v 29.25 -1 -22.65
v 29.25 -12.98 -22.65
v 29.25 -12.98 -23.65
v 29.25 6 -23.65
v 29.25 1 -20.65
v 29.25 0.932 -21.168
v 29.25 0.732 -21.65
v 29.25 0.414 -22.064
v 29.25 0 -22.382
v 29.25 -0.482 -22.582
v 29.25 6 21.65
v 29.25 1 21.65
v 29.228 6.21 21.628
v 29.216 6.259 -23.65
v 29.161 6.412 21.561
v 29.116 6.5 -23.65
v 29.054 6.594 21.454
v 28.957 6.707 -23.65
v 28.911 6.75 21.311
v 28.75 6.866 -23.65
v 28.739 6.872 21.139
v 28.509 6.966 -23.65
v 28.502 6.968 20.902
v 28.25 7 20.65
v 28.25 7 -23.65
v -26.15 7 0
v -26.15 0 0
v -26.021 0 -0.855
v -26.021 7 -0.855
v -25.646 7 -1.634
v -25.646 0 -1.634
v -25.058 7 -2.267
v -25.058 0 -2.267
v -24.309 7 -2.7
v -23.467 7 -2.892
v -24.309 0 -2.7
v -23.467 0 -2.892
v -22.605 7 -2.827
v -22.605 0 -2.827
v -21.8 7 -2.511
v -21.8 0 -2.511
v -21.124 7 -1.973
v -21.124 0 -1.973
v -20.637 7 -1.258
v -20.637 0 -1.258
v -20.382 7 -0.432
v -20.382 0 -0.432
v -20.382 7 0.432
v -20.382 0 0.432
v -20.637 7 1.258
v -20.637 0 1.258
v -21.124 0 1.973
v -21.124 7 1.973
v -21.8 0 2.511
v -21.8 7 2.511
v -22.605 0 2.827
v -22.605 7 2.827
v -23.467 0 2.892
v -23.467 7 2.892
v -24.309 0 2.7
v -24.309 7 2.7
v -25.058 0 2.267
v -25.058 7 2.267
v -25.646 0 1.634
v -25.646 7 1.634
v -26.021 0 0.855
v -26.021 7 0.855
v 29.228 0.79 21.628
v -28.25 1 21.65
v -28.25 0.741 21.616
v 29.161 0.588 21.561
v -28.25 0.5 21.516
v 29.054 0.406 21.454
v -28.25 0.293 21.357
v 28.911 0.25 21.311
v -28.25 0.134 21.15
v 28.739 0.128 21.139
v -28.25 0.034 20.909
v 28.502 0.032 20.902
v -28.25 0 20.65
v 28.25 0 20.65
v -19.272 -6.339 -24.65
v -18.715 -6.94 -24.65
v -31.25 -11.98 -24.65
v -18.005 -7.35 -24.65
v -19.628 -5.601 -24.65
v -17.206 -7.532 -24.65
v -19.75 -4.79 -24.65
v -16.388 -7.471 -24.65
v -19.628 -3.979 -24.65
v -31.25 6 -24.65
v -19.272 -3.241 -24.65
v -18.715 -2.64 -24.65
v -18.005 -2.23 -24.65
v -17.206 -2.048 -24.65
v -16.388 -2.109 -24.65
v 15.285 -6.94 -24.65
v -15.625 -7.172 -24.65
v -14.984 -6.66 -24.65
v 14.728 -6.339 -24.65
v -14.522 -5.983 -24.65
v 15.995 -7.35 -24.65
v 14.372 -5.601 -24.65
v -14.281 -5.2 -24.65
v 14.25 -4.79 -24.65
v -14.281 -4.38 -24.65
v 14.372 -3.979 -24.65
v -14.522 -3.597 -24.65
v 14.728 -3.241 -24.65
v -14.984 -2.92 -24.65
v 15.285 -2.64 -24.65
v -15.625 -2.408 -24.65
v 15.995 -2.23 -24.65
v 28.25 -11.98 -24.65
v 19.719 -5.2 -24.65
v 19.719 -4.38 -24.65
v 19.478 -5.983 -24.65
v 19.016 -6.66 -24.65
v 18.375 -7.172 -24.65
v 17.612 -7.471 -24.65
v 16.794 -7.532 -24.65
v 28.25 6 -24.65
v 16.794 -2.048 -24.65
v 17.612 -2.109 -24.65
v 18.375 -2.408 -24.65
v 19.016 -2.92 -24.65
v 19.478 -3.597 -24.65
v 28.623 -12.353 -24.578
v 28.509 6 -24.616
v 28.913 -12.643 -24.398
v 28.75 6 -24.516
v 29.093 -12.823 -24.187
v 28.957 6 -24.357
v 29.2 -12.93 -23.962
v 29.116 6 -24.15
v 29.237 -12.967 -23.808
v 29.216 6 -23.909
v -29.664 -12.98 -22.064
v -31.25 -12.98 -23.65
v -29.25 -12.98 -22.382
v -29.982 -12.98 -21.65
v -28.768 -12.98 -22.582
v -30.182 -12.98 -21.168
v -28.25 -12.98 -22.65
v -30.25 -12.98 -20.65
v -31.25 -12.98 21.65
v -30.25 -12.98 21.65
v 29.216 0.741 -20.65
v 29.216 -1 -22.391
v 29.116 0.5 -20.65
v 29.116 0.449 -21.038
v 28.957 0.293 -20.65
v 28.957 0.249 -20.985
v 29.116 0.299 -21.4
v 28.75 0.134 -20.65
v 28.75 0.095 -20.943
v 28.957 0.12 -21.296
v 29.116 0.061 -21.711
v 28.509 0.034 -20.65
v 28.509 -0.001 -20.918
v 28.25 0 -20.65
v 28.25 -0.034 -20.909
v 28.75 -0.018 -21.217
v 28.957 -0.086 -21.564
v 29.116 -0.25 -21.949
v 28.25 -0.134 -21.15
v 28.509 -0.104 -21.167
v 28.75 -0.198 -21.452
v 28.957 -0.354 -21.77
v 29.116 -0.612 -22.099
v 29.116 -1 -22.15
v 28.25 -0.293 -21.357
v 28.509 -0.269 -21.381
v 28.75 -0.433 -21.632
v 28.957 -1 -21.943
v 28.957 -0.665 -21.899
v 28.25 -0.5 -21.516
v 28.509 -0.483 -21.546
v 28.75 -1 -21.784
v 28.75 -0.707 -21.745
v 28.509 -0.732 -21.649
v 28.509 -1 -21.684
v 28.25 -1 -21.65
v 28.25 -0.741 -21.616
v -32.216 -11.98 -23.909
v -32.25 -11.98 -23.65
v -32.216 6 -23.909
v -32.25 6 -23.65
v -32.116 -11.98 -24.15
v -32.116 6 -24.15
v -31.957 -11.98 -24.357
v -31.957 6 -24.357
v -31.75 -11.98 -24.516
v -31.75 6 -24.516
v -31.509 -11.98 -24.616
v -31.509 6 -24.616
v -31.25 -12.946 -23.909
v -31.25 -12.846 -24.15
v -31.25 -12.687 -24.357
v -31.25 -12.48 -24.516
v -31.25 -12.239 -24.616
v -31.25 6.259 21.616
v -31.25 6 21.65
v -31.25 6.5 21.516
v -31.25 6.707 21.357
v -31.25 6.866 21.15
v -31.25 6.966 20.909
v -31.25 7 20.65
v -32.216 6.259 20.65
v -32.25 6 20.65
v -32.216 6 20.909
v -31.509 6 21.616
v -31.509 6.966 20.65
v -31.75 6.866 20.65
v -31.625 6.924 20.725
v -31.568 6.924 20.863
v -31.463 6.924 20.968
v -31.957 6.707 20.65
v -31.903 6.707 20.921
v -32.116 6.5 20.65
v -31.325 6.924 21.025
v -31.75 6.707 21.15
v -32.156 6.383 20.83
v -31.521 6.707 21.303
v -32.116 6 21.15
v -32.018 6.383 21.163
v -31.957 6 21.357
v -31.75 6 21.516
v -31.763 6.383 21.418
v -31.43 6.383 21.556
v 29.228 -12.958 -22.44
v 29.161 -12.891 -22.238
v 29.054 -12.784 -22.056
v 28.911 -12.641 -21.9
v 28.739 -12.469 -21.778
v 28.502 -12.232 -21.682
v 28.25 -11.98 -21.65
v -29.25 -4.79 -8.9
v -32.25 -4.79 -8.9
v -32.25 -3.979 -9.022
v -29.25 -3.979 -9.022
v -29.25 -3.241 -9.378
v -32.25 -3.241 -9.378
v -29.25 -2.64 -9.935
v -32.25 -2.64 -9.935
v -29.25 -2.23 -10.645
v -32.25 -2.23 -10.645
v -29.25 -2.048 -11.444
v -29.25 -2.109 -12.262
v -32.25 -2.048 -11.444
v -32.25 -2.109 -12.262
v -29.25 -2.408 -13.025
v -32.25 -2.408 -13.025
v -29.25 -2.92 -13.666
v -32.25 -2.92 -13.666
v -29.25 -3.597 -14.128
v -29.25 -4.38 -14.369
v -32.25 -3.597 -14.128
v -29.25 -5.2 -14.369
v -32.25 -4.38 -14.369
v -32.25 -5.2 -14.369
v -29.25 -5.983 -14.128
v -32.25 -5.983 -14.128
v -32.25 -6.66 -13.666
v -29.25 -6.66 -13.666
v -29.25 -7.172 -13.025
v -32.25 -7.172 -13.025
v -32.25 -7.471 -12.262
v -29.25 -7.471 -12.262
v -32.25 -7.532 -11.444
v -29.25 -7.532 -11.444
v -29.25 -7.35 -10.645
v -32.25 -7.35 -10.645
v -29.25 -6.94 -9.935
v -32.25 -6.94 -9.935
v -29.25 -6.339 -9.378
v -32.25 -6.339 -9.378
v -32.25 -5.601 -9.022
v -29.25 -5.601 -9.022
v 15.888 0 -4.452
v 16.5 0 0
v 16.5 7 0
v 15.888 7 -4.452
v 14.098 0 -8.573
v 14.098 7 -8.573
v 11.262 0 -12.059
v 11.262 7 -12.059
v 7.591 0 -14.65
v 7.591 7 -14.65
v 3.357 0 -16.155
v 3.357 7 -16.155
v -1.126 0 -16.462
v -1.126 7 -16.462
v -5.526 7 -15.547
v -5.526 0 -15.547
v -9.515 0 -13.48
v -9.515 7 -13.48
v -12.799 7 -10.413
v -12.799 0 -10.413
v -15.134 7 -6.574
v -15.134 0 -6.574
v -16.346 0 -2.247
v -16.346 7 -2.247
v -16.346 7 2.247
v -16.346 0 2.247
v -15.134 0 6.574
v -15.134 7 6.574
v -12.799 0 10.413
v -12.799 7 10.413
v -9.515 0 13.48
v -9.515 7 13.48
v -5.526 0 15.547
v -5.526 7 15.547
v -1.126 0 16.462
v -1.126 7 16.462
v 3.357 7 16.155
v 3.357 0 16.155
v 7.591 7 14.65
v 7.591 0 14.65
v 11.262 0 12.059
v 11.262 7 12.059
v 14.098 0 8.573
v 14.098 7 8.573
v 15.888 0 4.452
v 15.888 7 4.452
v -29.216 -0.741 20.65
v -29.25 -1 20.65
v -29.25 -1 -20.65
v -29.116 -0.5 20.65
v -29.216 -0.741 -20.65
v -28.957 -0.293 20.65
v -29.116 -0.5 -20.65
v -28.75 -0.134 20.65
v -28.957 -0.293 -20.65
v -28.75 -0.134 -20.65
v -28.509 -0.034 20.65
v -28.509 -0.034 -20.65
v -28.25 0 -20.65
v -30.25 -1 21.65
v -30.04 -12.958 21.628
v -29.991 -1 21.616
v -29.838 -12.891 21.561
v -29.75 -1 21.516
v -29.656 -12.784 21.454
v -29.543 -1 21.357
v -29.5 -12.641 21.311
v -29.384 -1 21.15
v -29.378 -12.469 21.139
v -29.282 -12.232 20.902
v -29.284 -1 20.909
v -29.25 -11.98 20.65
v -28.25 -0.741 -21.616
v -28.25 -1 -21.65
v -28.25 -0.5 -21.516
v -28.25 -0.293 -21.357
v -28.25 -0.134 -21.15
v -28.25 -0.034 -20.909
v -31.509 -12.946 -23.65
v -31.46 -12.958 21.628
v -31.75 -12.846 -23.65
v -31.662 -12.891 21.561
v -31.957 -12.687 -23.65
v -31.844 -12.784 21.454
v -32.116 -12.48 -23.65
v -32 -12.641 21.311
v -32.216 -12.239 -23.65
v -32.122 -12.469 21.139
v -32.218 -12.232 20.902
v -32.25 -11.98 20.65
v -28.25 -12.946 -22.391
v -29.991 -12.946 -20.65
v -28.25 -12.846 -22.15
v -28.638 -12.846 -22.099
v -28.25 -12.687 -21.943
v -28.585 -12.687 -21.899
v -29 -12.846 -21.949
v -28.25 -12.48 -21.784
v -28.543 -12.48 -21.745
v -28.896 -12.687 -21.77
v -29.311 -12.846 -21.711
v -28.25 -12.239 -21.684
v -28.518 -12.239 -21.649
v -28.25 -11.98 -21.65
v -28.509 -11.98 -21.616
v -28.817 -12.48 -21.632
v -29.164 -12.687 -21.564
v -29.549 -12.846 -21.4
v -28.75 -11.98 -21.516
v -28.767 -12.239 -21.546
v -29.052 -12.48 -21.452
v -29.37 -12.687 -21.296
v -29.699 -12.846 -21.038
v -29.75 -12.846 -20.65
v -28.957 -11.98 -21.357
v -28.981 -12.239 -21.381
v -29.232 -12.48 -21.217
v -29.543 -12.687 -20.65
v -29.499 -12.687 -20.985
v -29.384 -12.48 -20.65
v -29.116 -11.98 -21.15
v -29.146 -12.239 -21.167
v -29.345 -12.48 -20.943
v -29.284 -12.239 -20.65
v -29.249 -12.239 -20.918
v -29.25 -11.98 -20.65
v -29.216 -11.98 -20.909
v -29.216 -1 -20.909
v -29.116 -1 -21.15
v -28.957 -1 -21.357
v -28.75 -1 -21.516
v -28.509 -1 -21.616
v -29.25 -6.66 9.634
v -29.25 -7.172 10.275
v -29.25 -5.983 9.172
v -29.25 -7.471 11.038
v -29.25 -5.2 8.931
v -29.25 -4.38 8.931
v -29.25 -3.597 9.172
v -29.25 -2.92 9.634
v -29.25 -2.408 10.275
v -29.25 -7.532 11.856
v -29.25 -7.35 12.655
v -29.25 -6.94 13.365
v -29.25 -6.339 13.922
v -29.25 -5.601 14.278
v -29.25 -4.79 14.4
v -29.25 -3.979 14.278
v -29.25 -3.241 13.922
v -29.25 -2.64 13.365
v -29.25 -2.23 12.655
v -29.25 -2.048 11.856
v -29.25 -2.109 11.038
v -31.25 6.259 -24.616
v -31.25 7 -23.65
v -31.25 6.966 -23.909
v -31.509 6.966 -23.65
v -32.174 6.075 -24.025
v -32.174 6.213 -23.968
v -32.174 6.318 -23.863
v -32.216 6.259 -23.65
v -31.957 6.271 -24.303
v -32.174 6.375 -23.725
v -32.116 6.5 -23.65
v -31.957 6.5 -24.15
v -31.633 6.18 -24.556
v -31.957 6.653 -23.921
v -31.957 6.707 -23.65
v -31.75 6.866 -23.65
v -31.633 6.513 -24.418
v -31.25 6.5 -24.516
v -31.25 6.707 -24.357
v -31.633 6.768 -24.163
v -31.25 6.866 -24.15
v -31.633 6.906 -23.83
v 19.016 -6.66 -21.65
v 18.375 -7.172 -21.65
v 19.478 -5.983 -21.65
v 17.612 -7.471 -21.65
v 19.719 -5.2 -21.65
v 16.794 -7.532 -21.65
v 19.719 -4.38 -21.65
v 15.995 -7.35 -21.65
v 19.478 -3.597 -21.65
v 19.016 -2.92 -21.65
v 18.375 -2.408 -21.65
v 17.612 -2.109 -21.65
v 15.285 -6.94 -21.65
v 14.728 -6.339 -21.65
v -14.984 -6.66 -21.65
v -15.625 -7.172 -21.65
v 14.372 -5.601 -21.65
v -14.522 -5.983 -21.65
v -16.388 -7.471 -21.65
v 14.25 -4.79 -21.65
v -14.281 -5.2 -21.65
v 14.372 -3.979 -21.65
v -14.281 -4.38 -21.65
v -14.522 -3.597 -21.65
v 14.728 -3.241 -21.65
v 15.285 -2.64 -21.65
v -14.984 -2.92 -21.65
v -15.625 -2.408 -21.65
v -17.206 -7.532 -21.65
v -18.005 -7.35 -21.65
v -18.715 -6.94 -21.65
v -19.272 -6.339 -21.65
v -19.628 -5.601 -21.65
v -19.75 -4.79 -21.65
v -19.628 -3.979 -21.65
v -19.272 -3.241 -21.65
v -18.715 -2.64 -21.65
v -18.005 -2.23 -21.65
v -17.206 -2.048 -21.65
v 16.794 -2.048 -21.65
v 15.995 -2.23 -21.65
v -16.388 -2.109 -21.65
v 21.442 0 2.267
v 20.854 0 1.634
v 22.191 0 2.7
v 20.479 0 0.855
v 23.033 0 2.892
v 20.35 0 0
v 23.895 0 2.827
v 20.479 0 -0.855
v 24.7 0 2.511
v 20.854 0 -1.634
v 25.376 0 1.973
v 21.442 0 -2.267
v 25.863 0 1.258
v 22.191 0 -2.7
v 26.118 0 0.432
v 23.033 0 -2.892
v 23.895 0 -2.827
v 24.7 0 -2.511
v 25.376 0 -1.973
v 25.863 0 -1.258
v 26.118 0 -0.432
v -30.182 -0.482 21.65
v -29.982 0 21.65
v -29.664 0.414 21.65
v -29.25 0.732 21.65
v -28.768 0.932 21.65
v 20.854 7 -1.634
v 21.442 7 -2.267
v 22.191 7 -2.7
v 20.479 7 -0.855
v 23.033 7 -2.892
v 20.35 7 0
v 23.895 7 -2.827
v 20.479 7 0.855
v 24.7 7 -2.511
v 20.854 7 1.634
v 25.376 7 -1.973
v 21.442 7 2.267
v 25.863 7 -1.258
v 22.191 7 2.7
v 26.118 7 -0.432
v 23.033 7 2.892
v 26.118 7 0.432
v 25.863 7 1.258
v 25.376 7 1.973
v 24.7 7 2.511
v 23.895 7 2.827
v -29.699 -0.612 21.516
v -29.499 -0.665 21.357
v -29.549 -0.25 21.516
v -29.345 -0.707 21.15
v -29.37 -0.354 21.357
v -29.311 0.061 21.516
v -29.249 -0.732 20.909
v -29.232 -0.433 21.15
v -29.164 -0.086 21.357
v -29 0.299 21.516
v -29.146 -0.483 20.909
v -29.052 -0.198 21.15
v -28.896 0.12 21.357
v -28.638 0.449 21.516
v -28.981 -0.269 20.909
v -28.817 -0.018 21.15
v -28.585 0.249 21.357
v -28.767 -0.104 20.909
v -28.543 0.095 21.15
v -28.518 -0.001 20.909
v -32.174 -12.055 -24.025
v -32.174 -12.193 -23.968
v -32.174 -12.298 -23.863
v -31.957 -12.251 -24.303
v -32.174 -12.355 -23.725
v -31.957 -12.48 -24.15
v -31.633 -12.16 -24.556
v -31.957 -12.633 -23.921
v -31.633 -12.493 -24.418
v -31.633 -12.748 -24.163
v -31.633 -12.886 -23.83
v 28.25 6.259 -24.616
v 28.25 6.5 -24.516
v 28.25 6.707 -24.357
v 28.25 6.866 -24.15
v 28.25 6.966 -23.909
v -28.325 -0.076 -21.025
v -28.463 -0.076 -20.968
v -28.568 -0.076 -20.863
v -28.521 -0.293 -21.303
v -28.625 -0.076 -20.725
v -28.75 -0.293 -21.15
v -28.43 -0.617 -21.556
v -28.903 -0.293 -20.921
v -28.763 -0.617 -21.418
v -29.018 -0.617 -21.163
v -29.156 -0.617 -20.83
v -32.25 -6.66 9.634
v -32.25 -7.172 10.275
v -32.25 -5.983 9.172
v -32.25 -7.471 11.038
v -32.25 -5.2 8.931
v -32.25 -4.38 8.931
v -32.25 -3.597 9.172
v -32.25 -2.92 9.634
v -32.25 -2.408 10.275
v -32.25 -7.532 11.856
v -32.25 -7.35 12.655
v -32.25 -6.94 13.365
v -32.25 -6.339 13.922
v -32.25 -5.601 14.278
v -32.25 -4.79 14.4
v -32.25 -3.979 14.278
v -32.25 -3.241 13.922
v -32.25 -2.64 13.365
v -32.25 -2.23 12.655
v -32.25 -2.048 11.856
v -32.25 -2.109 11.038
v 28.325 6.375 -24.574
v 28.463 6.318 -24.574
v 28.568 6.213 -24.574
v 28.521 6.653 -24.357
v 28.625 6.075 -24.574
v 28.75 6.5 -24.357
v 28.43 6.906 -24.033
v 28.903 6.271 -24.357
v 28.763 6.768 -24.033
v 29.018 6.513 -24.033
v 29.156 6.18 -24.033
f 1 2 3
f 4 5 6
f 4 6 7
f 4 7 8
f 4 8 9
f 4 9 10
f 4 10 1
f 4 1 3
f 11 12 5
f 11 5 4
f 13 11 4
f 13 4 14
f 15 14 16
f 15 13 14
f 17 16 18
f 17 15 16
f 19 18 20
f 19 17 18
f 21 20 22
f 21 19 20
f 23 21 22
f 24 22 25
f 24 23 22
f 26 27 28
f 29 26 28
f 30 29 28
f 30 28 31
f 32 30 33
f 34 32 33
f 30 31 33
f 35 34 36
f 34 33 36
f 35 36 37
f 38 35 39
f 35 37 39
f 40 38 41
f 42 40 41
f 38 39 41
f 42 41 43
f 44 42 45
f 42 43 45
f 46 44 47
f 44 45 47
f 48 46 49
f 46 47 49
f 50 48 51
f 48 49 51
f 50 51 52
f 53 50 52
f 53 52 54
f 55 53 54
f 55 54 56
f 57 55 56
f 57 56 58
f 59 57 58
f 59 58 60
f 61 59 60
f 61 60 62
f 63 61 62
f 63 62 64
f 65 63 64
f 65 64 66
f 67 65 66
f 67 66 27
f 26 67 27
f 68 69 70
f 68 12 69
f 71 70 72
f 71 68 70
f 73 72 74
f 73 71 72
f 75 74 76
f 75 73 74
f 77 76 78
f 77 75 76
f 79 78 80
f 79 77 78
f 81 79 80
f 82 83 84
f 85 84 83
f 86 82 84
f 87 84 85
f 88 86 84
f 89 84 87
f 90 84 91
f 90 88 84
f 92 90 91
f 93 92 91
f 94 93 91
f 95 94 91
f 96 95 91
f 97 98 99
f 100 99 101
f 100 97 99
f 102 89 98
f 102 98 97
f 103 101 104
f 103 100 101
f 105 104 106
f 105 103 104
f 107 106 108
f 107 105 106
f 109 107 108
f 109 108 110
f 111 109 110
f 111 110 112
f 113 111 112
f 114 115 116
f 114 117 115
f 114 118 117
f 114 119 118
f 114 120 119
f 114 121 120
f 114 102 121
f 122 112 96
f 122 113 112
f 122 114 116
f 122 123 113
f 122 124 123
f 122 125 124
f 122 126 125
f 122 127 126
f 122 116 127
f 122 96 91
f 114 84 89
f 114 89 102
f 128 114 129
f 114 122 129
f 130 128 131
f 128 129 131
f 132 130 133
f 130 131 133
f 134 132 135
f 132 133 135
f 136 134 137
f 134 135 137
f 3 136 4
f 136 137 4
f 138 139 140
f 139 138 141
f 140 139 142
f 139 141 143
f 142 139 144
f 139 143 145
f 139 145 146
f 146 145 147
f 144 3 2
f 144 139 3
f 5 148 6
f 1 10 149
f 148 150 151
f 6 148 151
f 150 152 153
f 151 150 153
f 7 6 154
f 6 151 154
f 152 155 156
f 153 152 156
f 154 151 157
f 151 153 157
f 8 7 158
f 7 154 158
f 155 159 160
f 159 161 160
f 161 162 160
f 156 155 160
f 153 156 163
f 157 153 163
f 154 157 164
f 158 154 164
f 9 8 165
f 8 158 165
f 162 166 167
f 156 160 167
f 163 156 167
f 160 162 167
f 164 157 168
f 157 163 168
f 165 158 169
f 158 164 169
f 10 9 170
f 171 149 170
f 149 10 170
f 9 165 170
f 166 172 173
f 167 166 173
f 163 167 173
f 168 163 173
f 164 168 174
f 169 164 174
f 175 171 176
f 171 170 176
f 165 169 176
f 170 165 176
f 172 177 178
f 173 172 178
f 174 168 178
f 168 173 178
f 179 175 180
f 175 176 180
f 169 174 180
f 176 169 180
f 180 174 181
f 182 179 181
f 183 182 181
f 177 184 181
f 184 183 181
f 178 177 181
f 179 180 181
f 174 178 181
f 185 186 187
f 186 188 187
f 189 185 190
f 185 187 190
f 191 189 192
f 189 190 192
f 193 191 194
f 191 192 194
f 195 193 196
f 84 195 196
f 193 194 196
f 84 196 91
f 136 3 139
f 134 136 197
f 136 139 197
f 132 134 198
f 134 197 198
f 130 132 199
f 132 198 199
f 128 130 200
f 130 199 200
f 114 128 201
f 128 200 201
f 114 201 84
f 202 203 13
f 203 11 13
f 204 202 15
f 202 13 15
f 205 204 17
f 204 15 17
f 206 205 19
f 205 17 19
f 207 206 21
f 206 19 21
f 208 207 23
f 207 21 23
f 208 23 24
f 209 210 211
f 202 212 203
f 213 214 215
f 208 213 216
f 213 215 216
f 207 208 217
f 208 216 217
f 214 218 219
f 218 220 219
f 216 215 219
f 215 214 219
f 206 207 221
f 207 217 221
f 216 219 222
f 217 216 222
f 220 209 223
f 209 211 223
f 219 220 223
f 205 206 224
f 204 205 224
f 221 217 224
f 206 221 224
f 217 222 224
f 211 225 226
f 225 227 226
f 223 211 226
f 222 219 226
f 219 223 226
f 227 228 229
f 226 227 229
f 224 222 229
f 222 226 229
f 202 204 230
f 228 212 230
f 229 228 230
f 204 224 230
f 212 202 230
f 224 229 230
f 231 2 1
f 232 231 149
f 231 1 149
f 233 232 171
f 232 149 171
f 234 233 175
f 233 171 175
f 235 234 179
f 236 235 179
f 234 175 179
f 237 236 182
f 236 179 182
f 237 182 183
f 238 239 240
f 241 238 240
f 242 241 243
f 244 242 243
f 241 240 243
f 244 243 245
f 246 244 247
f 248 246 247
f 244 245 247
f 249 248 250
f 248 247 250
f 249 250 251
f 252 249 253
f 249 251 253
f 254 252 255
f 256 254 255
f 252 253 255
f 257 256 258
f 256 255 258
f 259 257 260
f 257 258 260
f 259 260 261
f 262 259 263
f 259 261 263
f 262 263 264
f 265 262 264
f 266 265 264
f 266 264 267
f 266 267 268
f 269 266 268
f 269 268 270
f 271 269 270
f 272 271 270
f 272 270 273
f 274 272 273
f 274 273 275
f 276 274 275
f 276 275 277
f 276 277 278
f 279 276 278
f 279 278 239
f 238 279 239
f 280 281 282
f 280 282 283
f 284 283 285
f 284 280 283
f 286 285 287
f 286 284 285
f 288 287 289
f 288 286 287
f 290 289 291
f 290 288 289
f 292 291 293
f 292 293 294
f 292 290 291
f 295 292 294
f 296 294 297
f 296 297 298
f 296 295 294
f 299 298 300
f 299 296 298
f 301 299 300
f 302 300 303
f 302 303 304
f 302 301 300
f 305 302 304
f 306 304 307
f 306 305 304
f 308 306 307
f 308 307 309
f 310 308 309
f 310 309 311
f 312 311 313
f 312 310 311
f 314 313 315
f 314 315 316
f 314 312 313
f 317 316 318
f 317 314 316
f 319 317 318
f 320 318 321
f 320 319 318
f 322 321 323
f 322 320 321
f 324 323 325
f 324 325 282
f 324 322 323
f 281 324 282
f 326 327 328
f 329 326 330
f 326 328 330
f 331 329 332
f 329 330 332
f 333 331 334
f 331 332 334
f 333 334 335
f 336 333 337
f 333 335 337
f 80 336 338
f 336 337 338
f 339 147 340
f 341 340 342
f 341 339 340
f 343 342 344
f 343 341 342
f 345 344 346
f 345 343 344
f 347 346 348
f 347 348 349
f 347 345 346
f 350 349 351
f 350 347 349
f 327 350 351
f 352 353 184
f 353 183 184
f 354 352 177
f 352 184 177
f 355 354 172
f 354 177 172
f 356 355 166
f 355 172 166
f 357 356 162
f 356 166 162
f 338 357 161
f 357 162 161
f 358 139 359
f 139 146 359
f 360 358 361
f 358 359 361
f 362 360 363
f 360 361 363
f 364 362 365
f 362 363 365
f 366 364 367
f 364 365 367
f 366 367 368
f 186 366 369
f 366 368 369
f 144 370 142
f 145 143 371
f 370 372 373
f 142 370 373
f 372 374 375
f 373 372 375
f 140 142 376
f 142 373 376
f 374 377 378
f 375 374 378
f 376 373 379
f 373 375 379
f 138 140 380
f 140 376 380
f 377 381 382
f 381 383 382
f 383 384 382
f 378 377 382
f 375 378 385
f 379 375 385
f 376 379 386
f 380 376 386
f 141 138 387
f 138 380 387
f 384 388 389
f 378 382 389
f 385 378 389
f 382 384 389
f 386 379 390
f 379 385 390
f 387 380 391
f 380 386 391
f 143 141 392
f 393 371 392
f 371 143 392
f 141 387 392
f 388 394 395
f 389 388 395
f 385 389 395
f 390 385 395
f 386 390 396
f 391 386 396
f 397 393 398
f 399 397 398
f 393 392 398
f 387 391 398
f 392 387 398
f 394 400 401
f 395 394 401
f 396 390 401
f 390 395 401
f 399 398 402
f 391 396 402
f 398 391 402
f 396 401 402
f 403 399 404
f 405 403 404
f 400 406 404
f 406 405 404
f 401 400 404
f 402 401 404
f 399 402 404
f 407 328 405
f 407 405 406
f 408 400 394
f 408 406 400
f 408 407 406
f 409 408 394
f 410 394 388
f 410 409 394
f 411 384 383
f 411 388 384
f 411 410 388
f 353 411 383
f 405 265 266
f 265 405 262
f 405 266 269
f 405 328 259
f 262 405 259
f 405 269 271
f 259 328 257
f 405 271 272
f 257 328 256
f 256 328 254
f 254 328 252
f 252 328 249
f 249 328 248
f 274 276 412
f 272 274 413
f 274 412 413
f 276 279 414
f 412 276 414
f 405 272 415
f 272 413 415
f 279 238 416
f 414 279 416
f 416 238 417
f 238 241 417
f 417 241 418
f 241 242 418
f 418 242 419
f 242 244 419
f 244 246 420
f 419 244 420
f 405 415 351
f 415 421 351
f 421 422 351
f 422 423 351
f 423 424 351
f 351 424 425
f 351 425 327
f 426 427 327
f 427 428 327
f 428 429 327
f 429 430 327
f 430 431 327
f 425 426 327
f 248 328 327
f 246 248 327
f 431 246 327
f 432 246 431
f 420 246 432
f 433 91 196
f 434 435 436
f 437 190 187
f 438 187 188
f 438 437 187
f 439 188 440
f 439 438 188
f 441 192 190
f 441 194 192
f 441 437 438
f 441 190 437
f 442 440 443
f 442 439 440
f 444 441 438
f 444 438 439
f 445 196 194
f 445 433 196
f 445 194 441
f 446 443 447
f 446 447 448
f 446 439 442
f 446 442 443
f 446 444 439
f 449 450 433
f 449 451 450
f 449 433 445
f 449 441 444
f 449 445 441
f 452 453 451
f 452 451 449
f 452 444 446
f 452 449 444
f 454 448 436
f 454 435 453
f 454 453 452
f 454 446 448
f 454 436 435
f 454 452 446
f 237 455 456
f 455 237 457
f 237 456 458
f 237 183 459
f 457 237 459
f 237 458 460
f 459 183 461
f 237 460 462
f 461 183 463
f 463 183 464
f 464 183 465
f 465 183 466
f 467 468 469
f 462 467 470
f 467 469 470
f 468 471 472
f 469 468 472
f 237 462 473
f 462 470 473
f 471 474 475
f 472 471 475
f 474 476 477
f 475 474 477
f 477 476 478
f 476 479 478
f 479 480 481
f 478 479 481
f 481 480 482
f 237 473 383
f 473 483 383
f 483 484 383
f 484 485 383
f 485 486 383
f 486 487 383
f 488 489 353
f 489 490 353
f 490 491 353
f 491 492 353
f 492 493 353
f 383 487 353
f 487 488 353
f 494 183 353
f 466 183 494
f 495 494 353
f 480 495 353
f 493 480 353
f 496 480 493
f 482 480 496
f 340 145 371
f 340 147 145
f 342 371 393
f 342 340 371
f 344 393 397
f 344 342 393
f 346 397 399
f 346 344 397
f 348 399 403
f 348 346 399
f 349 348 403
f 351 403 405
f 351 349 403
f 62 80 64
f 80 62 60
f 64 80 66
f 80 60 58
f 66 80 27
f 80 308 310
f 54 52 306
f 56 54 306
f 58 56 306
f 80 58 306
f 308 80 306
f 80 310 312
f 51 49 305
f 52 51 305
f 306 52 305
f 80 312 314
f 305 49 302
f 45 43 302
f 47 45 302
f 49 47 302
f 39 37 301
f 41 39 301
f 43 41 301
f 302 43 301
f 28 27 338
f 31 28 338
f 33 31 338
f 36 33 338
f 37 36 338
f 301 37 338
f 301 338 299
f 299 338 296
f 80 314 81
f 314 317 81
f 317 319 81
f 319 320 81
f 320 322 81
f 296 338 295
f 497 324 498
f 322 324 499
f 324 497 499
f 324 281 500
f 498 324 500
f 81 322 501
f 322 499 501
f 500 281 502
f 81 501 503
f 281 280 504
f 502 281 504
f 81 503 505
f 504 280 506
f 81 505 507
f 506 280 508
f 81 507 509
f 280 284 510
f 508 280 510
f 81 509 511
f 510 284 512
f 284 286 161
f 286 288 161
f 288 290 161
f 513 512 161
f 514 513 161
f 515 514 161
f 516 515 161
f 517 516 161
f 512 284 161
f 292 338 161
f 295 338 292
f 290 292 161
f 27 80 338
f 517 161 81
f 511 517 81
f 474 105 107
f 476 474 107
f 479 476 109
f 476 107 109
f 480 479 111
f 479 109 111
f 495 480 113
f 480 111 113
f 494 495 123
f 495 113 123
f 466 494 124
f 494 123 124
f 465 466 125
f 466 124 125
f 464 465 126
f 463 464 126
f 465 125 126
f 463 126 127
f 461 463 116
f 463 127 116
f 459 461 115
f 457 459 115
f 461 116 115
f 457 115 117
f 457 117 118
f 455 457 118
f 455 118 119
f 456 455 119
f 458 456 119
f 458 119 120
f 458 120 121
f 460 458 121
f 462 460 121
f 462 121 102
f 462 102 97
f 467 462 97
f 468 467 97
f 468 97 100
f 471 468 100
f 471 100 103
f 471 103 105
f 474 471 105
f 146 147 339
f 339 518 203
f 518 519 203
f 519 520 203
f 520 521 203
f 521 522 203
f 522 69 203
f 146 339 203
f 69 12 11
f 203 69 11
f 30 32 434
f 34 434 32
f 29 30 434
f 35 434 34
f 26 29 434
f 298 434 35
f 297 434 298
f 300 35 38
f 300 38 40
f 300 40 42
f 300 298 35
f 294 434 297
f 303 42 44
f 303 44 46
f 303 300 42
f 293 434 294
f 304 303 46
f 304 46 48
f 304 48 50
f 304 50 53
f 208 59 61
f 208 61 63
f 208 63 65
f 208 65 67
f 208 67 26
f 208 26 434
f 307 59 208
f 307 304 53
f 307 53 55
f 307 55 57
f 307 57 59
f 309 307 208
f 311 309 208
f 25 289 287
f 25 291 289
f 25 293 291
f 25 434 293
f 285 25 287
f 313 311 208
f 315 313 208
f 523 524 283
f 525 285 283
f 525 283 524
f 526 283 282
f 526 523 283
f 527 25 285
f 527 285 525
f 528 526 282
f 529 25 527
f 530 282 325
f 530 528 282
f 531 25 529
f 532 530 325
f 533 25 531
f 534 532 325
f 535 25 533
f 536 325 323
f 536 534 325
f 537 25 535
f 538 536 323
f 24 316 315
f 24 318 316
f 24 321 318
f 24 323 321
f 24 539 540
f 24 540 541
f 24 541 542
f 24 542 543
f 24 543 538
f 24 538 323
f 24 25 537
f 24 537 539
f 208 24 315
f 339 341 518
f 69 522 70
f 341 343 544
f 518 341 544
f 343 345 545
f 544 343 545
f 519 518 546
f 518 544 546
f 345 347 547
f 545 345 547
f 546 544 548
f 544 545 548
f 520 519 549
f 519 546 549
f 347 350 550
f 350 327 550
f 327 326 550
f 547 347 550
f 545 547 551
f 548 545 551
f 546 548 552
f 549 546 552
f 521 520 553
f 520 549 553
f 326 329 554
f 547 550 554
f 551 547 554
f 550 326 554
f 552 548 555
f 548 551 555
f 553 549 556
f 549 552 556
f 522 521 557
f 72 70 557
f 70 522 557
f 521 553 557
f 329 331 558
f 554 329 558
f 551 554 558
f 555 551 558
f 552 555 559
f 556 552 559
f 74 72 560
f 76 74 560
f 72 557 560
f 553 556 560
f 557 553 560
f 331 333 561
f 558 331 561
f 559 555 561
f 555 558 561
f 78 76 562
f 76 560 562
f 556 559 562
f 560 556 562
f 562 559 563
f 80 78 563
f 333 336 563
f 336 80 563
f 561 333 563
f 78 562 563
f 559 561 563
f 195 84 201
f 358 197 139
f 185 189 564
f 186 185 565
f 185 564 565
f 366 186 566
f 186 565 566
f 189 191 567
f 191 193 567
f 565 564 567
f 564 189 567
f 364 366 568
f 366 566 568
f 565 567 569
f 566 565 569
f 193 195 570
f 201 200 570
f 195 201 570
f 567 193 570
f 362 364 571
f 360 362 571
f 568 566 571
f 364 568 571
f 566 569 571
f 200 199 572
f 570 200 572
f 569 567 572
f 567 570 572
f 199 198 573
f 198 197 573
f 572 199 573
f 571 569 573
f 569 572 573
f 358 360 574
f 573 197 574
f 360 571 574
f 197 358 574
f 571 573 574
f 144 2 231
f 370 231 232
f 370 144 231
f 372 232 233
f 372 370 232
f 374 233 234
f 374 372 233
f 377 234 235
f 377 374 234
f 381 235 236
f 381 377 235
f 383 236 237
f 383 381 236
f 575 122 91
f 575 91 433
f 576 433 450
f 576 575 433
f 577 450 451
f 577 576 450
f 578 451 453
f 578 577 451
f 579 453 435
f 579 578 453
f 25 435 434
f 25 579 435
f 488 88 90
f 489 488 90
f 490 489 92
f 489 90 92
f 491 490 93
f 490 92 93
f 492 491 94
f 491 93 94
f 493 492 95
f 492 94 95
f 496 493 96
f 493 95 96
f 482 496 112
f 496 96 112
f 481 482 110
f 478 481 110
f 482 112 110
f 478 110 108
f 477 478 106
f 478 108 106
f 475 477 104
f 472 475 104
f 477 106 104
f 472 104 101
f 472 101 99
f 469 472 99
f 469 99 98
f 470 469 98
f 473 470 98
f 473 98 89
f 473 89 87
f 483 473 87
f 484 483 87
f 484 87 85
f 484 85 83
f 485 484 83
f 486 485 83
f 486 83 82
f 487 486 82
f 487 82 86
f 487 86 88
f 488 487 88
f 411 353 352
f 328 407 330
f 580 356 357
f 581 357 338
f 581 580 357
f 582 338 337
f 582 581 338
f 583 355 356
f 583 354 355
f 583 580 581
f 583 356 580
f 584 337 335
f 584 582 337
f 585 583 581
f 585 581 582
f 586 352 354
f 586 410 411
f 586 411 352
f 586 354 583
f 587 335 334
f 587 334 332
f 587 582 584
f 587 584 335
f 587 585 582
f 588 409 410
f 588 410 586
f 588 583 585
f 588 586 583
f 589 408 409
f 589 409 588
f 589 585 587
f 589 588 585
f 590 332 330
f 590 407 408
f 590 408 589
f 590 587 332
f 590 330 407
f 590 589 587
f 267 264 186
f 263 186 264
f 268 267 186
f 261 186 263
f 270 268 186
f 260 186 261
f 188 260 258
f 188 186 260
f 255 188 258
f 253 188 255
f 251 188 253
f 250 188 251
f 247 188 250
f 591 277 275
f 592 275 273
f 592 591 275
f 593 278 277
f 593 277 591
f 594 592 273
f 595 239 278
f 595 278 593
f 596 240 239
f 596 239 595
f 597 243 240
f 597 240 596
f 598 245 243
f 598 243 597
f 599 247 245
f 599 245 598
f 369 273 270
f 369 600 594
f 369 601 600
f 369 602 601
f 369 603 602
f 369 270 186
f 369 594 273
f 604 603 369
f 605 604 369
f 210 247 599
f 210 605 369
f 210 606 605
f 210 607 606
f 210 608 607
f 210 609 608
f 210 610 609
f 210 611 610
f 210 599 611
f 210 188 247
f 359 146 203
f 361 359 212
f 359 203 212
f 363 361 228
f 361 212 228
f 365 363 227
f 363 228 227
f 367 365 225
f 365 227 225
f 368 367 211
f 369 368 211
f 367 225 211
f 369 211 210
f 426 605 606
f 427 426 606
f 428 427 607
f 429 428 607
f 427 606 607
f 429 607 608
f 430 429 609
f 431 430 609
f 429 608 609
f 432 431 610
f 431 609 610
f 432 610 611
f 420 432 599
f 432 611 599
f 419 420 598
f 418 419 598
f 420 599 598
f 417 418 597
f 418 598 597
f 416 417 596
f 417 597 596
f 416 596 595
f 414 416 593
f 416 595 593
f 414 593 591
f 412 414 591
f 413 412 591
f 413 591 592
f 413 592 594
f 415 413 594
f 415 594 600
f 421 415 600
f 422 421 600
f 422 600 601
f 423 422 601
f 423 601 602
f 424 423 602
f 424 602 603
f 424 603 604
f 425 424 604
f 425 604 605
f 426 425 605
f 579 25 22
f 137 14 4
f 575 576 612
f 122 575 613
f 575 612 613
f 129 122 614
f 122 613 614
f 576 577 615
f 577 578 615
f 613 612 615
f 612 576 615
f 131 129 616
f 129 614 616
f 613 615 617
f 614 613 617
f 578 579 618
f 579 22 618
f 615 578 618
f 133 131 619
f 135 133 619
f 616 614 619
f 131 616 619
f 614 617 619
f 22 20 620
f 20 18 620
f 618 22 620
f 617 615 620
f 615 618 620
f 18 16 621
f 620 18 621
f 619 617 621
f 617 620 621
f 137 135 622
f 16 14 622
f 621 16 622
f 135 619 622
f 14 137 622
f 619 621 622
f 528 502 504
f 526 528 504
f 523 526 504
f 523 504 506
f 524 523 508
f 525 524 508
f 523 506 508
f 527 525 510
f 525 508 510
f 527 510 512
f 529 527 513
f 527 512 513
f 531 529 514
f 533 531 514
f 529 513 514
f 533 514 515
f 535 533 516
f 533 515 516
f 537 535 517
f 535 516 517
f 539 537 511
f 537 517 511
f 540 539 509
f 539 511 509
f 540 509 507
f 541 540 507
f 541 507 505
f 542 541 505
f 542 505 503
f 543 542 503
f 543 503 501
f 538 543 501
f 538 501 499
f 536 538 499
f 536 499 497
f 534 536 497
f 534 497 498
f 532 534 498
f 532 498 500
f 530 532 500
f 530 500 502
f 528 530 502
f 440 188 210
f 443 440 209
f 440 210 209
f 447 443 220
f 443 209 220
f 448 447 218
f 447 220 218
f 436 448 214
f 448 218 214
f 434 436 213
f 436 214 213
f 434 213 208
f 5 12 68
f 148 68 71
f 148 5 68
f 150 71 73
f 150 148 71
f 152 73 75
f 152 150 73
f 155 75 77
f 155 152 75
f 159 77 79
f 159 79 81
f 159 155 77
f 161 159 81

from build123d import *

# Parameters (mm, degrees)
SKETCH1_W                = 58.5
SKETCH1_H                = 43.3
SKETCH1_R                = 16.5
BOSS_EXTRUDE1_DEPTH      = 7
M5_CLEARANCE_HOLE1_D     = 5.8
M5_CLEARANCE_HOLE1_DEPTH = 7
SKETCH5_W                = 58.5
SKETCH5_H                = 19.98
BOSS_EXTRUDE2_DEPTH      = 3
SKETCH6_W                = 46.3
SKETCH6_H                = 19.98
BOSS_EXTRUDE3_DEPTH      = 3
M5_CLEARANCE_HOLE2_D     = 5.5
M5_CLEARANCE_HOLE2_DEPTH = 3
M5_CLEARANCE_HOLE3_D     = 5.5
M5_CLEARANCE_HOLE3_DEPTH = 3
FILLET1_R                = 1
FILLET2_R                = 1


with BuildPart() as part:
    # Sketch1 → Boss-Extrude1 (new body)
    with BuildSketch(Plane(origin=(0, 0, 0), x_dir=(1, 0, 0), z_dir=(0, 1, 0))):
        Rectangle(SKETCH1_W, SKETCH1_H)
        Circle(SKETCH1_R, mode=Mode.SUBTRACT)
    extrude(amount=BOSS_EXTRUDE1_DEPTH)

    # M5 Clearance Hole1
    with Locations(Plane(origin=(0, 7, 0), x_dir=(1, 0, 0), z_dir=(0, 1, 0))):
        with Locations((-23.25, 0), (23.25, 0)):
            Hole(M5_CLEARANCE_HOLE1_D / 2, depth=M5_CLEARANCE_HOLE1_DEPTH)

    # Sketch5 → Boss-Extrude2 (add)
    with BuildSketch(Plane(origin=(0, 0, -21.65), x_dir=(-1, 0, 0), z_dir=(0, 0, -1))):
        with Locations((0, -2.99)):
            Rectangle(SKETCH5_W, SKETCH5_H)
    extrude(amount=BOSS_EXTRUDE2_DEPTH)

    # Sketch6 → Boss-Extrude3 (add)
    with BuildSketch(Plane.ZY.offset(29.25)):
        with Locations((-1.5, -2.99)):
            Rectangle(SKETCH6_W, SKETCH6_H)
    extrude(amount=BOSS_EXTRUDE3_DEPTH)

    # M5 Clearance Hole2
    with Locations(Plane.XY.offset(-21.65)):
        with Locations((-17, -4.79), (17, -4.79)):
            Hole(M5_CLEARANCE_HOLE2_D / 2, depth=M5_CLEARANCE_HOLE2_DEPTH)

    # M5 Clearance Hole3
    with Locations(Plane(origin=(-29.25, 0, 0), x_dir=(0, 0, -1), z_dir=(1, 0, 0))):
        with Locations((-11.65, -4.79), (11.65, -4.79)):
            Hole(M5_CLEARANCE_HOLE3_D / 2, depth=M5_CLEARANCE_HOLE3_DEPTH)

    # Fillet1
    fillet1_edges = [part.edges().sort_by_distance(p)[0] for p in [
        (-29.25, -6.49, -21.65),
        (29.25, -6.49, -21.65),
        (0, -12.98, -21.65),
        (-29.25, -12.98, 0),
        (-29.25, -6.49, 21.65),
        (0, 0, -21.65),
        (29.25, 0, 0),
        (0, 0, 21.65),
        (-29.25, 0, 0),
    ]]
    fillet(fillet1_edges, radius=FILLET1_R)

    # Fillet2
    fillet2_edges = [part.edges().sort_by_distance(p)[0] for p in [
        (29.25, 7, -1.5),
        (-1.5, 7, -24.65),
        (29.25, -2.99, -24.65),
        (-1.5, -12.98, -24.65),
        (-32.25, -2.99, -24.65),
        (-32.25, -12.98, -1.5),
        (-32.25, -2.99, 21.65),
        (-32.25, 7, -1.5),
        (-1.5, 7, 21.65),
    ]]
    fillet(fillet2_edges, radius=FILLET2_R)


solid = part.part
